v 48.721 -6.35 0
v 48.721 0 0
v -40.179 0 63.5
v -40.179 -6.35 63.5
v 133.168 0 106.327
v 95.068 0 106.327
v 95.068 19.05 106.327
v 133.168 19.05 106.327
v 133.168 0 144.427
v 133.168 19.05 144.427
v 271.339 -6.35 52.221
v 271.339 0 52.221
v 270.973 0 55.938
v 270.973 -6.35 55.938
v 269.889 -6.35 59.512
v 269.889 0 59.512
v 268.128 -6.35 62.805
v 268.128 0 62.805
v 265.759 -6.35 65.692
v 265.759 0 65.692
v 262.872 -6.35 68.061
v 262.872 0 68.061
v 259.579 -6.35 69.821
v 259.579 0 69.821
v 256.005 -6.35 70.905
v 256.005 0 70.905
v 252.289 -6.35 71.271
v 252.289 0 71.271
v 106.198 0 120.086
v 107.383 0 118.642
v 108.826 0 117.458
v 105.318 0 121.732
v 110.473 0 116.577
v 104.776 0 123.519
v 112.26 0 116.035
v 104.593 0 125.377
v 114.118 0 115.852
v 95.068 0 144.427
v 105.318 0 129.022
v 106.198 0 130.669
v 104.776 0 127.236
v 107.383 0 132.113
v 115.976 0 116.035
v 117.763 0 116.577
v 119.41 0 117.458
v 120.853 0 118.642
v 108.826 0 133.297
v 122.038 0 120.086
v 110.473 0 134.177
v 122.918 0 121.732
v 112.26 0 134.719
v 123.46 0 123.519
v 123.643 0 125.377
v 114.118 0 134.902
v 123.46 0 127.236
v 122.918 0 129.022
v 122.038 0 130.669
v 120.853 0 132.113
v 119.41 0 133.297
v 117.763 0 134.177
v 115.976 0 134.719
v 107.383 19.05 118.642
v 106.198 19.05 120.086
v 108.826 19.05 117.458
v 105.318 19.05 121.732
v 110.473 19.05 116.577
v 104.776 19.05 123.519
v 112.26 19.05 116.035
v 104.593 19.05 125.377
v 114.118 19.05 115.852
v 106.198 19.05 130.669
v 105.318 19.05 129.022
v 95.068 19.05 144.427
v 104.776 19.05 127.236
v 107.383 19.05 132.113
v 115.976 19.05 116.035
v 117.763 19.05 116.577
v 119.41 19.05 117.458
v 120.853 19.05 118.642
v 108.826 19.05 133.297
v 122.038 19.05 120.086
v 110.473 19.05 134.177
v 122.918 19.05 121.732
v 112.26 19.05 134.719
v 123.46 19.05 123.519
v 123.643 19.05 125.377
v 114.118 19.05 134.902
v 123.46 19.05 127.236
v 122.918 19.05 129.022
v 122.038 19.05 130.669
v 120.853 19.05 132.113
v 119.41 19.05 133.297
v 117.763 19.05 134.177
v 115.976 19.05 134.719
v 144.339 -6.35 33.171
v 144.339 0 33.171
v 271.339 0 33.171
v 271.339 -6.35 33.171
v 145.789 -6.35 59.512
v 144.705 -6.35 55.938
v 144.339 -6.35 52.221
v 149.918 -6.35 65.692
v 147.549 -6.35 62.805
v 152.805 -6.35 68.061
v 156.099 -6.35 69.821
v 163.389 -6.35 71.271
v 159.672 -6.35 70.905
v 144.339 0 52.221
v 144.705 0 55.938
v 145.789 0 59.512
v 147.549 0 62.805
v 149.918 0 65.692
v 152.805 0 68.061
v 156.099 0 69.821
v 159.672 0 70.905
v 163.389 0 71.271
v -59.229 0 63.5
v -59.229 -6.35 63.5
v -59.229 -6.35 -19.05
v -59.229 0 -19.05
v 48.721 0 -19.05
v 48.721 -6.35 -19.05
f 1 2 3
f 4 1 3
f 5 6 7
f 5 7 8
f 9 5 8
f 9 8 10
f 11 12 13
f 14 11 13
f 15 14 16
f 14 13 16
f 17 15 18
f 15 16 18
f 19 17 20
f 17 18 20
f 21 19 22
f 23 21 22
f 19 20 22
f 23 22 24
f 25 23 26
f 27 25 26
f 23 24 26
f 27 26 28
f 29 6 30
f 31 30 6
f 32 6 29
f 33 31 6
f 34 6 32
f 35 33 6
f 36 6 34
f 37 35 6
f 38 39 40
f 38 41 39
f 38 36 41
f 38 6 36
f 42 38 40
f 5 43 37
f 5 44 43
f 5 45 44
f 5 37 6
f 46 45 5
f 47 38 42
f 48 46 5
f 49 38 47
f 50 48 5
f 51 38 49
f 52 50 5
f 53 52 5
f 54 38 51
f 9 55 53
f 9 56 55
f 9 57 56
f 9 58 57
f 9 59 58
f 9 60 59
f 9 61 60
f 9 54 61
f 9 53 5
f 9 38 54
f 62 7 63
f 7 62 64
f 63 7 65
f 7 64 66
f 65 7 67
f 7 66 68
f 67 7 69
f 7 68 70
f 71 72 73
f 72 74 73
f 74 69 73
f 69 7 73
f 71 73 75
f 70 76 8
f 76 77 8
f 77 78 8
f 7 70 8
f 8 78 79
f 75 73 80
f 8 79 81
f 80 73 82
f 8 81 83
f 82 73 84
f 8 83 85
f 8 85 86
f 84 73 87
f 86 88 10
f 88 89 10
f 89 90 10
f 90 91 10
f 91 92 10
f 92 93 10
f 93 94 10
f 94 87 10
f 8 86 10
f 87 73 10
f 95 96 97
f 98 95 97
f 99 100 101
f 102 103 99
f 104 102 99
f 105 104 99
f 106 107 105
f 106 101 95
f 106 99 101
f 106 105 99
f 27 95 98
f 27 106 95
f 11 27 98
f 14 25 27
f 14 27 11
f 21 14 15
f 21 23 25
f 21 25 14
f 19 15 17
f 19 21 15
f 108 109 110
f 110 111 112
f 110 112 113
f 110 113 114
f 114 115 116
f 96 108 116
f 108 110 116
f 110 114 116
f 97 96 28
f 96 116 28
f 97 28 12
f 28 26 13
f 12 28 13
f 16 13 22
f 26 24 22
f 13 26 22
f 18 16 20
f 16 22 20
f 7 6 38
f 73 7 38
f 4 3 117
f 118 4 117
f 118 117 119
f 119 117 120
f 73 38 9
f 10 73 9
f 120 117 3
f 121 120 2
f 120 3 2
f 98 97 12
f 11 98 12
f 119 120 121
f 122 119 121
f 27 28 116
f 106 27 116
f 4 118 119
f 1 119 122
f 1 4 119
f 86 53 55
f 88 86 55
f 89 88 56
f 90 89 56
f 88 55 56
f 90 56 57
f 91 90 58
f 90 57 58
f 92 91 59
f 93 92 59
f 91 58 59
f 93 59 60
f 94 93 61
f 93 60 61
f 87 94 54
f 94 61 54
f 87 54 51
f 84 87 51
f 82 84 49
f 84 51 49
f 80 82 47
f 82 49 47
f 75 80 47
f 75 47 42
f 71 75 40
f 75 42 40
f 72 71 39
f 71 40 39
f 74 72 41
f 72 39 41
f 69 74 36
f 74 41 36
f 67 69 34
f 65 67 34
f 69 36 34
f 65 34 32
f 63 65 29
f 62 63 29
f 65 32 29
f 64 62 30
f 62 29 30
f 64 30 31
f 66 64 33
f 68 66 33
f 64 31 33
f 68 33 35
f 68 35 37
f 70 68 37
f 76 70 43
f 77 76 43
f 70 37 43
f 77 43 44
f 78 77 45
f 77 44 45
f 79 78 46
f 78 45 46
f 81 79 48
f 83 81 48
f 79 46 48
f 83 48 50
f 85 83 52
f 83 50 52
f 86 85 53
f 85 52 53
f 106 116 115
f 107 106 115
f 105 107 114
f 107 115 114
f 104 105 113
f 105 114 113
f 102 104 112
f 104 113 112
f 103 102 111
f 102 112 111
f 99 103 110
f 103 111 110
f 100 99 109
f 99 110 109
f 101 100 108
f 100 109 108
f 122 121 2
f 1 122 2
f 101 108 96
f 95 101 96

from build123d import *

# Parameters (mm, degrees)
F1_DEPTH = 6.35
F3_DEPTH = 6.35
F4_W     = 38.1
F4_H     = 38.1
F4_R     = 9.525
F5_DEPTH = 19.05


with BuildPart() as f1:
    # F0 (on Front) → F1 (new body)
    with BuildSketch(Plane.XZ):
        Polygon((48.721302, 0), (-40.178698, 63.5), (-59.228698, 63.5), (-59.228698, -19.05), (48.721302, -19.05), align=None)
    extrude(amount=F1_DEPTH)


with BuildPart() as f3:
    # F2 (on Front) → F3 (new body)
    with BuildSketch(Plane.XZ):
        with BuildLine():
            Line((252.288677, 71.27145), (163.388677, 71.27145))
            ThreePointArc((163.388677, 71.27145), (149.918293, 65.691834), (144.338677, 52.22145))
            Line((144.338677, 52.22145), (144.338677, 33.17145))
            Line((144.338677, 33.17145), (271.338677, 33.17145))
            Line((271.338677, 33.17145), (271.338677, 52.22145))
            ThreePointArc((271.338677, 52.22145), (265.759061, 65.691834), (252.288677, 71.27145))
        make_face()
    extrude(amount=F3_DEPTH)


with BuildPart() as f5:
    # F4 (on Front) → F5 (new body)
    with BuildSketch(Plane.XZ):
        with Locations((114.117831, 125.377322)):
            Rectangle(F4_W, F4_H)
        with Locations((114.117831, 125.377322)):
            Circle(F4_R, mode=Mode.SUBTRACT)
    extrude(amount=-F5_DEPTH)


solid = Compound([f1.part, f3.part, f5.part])
